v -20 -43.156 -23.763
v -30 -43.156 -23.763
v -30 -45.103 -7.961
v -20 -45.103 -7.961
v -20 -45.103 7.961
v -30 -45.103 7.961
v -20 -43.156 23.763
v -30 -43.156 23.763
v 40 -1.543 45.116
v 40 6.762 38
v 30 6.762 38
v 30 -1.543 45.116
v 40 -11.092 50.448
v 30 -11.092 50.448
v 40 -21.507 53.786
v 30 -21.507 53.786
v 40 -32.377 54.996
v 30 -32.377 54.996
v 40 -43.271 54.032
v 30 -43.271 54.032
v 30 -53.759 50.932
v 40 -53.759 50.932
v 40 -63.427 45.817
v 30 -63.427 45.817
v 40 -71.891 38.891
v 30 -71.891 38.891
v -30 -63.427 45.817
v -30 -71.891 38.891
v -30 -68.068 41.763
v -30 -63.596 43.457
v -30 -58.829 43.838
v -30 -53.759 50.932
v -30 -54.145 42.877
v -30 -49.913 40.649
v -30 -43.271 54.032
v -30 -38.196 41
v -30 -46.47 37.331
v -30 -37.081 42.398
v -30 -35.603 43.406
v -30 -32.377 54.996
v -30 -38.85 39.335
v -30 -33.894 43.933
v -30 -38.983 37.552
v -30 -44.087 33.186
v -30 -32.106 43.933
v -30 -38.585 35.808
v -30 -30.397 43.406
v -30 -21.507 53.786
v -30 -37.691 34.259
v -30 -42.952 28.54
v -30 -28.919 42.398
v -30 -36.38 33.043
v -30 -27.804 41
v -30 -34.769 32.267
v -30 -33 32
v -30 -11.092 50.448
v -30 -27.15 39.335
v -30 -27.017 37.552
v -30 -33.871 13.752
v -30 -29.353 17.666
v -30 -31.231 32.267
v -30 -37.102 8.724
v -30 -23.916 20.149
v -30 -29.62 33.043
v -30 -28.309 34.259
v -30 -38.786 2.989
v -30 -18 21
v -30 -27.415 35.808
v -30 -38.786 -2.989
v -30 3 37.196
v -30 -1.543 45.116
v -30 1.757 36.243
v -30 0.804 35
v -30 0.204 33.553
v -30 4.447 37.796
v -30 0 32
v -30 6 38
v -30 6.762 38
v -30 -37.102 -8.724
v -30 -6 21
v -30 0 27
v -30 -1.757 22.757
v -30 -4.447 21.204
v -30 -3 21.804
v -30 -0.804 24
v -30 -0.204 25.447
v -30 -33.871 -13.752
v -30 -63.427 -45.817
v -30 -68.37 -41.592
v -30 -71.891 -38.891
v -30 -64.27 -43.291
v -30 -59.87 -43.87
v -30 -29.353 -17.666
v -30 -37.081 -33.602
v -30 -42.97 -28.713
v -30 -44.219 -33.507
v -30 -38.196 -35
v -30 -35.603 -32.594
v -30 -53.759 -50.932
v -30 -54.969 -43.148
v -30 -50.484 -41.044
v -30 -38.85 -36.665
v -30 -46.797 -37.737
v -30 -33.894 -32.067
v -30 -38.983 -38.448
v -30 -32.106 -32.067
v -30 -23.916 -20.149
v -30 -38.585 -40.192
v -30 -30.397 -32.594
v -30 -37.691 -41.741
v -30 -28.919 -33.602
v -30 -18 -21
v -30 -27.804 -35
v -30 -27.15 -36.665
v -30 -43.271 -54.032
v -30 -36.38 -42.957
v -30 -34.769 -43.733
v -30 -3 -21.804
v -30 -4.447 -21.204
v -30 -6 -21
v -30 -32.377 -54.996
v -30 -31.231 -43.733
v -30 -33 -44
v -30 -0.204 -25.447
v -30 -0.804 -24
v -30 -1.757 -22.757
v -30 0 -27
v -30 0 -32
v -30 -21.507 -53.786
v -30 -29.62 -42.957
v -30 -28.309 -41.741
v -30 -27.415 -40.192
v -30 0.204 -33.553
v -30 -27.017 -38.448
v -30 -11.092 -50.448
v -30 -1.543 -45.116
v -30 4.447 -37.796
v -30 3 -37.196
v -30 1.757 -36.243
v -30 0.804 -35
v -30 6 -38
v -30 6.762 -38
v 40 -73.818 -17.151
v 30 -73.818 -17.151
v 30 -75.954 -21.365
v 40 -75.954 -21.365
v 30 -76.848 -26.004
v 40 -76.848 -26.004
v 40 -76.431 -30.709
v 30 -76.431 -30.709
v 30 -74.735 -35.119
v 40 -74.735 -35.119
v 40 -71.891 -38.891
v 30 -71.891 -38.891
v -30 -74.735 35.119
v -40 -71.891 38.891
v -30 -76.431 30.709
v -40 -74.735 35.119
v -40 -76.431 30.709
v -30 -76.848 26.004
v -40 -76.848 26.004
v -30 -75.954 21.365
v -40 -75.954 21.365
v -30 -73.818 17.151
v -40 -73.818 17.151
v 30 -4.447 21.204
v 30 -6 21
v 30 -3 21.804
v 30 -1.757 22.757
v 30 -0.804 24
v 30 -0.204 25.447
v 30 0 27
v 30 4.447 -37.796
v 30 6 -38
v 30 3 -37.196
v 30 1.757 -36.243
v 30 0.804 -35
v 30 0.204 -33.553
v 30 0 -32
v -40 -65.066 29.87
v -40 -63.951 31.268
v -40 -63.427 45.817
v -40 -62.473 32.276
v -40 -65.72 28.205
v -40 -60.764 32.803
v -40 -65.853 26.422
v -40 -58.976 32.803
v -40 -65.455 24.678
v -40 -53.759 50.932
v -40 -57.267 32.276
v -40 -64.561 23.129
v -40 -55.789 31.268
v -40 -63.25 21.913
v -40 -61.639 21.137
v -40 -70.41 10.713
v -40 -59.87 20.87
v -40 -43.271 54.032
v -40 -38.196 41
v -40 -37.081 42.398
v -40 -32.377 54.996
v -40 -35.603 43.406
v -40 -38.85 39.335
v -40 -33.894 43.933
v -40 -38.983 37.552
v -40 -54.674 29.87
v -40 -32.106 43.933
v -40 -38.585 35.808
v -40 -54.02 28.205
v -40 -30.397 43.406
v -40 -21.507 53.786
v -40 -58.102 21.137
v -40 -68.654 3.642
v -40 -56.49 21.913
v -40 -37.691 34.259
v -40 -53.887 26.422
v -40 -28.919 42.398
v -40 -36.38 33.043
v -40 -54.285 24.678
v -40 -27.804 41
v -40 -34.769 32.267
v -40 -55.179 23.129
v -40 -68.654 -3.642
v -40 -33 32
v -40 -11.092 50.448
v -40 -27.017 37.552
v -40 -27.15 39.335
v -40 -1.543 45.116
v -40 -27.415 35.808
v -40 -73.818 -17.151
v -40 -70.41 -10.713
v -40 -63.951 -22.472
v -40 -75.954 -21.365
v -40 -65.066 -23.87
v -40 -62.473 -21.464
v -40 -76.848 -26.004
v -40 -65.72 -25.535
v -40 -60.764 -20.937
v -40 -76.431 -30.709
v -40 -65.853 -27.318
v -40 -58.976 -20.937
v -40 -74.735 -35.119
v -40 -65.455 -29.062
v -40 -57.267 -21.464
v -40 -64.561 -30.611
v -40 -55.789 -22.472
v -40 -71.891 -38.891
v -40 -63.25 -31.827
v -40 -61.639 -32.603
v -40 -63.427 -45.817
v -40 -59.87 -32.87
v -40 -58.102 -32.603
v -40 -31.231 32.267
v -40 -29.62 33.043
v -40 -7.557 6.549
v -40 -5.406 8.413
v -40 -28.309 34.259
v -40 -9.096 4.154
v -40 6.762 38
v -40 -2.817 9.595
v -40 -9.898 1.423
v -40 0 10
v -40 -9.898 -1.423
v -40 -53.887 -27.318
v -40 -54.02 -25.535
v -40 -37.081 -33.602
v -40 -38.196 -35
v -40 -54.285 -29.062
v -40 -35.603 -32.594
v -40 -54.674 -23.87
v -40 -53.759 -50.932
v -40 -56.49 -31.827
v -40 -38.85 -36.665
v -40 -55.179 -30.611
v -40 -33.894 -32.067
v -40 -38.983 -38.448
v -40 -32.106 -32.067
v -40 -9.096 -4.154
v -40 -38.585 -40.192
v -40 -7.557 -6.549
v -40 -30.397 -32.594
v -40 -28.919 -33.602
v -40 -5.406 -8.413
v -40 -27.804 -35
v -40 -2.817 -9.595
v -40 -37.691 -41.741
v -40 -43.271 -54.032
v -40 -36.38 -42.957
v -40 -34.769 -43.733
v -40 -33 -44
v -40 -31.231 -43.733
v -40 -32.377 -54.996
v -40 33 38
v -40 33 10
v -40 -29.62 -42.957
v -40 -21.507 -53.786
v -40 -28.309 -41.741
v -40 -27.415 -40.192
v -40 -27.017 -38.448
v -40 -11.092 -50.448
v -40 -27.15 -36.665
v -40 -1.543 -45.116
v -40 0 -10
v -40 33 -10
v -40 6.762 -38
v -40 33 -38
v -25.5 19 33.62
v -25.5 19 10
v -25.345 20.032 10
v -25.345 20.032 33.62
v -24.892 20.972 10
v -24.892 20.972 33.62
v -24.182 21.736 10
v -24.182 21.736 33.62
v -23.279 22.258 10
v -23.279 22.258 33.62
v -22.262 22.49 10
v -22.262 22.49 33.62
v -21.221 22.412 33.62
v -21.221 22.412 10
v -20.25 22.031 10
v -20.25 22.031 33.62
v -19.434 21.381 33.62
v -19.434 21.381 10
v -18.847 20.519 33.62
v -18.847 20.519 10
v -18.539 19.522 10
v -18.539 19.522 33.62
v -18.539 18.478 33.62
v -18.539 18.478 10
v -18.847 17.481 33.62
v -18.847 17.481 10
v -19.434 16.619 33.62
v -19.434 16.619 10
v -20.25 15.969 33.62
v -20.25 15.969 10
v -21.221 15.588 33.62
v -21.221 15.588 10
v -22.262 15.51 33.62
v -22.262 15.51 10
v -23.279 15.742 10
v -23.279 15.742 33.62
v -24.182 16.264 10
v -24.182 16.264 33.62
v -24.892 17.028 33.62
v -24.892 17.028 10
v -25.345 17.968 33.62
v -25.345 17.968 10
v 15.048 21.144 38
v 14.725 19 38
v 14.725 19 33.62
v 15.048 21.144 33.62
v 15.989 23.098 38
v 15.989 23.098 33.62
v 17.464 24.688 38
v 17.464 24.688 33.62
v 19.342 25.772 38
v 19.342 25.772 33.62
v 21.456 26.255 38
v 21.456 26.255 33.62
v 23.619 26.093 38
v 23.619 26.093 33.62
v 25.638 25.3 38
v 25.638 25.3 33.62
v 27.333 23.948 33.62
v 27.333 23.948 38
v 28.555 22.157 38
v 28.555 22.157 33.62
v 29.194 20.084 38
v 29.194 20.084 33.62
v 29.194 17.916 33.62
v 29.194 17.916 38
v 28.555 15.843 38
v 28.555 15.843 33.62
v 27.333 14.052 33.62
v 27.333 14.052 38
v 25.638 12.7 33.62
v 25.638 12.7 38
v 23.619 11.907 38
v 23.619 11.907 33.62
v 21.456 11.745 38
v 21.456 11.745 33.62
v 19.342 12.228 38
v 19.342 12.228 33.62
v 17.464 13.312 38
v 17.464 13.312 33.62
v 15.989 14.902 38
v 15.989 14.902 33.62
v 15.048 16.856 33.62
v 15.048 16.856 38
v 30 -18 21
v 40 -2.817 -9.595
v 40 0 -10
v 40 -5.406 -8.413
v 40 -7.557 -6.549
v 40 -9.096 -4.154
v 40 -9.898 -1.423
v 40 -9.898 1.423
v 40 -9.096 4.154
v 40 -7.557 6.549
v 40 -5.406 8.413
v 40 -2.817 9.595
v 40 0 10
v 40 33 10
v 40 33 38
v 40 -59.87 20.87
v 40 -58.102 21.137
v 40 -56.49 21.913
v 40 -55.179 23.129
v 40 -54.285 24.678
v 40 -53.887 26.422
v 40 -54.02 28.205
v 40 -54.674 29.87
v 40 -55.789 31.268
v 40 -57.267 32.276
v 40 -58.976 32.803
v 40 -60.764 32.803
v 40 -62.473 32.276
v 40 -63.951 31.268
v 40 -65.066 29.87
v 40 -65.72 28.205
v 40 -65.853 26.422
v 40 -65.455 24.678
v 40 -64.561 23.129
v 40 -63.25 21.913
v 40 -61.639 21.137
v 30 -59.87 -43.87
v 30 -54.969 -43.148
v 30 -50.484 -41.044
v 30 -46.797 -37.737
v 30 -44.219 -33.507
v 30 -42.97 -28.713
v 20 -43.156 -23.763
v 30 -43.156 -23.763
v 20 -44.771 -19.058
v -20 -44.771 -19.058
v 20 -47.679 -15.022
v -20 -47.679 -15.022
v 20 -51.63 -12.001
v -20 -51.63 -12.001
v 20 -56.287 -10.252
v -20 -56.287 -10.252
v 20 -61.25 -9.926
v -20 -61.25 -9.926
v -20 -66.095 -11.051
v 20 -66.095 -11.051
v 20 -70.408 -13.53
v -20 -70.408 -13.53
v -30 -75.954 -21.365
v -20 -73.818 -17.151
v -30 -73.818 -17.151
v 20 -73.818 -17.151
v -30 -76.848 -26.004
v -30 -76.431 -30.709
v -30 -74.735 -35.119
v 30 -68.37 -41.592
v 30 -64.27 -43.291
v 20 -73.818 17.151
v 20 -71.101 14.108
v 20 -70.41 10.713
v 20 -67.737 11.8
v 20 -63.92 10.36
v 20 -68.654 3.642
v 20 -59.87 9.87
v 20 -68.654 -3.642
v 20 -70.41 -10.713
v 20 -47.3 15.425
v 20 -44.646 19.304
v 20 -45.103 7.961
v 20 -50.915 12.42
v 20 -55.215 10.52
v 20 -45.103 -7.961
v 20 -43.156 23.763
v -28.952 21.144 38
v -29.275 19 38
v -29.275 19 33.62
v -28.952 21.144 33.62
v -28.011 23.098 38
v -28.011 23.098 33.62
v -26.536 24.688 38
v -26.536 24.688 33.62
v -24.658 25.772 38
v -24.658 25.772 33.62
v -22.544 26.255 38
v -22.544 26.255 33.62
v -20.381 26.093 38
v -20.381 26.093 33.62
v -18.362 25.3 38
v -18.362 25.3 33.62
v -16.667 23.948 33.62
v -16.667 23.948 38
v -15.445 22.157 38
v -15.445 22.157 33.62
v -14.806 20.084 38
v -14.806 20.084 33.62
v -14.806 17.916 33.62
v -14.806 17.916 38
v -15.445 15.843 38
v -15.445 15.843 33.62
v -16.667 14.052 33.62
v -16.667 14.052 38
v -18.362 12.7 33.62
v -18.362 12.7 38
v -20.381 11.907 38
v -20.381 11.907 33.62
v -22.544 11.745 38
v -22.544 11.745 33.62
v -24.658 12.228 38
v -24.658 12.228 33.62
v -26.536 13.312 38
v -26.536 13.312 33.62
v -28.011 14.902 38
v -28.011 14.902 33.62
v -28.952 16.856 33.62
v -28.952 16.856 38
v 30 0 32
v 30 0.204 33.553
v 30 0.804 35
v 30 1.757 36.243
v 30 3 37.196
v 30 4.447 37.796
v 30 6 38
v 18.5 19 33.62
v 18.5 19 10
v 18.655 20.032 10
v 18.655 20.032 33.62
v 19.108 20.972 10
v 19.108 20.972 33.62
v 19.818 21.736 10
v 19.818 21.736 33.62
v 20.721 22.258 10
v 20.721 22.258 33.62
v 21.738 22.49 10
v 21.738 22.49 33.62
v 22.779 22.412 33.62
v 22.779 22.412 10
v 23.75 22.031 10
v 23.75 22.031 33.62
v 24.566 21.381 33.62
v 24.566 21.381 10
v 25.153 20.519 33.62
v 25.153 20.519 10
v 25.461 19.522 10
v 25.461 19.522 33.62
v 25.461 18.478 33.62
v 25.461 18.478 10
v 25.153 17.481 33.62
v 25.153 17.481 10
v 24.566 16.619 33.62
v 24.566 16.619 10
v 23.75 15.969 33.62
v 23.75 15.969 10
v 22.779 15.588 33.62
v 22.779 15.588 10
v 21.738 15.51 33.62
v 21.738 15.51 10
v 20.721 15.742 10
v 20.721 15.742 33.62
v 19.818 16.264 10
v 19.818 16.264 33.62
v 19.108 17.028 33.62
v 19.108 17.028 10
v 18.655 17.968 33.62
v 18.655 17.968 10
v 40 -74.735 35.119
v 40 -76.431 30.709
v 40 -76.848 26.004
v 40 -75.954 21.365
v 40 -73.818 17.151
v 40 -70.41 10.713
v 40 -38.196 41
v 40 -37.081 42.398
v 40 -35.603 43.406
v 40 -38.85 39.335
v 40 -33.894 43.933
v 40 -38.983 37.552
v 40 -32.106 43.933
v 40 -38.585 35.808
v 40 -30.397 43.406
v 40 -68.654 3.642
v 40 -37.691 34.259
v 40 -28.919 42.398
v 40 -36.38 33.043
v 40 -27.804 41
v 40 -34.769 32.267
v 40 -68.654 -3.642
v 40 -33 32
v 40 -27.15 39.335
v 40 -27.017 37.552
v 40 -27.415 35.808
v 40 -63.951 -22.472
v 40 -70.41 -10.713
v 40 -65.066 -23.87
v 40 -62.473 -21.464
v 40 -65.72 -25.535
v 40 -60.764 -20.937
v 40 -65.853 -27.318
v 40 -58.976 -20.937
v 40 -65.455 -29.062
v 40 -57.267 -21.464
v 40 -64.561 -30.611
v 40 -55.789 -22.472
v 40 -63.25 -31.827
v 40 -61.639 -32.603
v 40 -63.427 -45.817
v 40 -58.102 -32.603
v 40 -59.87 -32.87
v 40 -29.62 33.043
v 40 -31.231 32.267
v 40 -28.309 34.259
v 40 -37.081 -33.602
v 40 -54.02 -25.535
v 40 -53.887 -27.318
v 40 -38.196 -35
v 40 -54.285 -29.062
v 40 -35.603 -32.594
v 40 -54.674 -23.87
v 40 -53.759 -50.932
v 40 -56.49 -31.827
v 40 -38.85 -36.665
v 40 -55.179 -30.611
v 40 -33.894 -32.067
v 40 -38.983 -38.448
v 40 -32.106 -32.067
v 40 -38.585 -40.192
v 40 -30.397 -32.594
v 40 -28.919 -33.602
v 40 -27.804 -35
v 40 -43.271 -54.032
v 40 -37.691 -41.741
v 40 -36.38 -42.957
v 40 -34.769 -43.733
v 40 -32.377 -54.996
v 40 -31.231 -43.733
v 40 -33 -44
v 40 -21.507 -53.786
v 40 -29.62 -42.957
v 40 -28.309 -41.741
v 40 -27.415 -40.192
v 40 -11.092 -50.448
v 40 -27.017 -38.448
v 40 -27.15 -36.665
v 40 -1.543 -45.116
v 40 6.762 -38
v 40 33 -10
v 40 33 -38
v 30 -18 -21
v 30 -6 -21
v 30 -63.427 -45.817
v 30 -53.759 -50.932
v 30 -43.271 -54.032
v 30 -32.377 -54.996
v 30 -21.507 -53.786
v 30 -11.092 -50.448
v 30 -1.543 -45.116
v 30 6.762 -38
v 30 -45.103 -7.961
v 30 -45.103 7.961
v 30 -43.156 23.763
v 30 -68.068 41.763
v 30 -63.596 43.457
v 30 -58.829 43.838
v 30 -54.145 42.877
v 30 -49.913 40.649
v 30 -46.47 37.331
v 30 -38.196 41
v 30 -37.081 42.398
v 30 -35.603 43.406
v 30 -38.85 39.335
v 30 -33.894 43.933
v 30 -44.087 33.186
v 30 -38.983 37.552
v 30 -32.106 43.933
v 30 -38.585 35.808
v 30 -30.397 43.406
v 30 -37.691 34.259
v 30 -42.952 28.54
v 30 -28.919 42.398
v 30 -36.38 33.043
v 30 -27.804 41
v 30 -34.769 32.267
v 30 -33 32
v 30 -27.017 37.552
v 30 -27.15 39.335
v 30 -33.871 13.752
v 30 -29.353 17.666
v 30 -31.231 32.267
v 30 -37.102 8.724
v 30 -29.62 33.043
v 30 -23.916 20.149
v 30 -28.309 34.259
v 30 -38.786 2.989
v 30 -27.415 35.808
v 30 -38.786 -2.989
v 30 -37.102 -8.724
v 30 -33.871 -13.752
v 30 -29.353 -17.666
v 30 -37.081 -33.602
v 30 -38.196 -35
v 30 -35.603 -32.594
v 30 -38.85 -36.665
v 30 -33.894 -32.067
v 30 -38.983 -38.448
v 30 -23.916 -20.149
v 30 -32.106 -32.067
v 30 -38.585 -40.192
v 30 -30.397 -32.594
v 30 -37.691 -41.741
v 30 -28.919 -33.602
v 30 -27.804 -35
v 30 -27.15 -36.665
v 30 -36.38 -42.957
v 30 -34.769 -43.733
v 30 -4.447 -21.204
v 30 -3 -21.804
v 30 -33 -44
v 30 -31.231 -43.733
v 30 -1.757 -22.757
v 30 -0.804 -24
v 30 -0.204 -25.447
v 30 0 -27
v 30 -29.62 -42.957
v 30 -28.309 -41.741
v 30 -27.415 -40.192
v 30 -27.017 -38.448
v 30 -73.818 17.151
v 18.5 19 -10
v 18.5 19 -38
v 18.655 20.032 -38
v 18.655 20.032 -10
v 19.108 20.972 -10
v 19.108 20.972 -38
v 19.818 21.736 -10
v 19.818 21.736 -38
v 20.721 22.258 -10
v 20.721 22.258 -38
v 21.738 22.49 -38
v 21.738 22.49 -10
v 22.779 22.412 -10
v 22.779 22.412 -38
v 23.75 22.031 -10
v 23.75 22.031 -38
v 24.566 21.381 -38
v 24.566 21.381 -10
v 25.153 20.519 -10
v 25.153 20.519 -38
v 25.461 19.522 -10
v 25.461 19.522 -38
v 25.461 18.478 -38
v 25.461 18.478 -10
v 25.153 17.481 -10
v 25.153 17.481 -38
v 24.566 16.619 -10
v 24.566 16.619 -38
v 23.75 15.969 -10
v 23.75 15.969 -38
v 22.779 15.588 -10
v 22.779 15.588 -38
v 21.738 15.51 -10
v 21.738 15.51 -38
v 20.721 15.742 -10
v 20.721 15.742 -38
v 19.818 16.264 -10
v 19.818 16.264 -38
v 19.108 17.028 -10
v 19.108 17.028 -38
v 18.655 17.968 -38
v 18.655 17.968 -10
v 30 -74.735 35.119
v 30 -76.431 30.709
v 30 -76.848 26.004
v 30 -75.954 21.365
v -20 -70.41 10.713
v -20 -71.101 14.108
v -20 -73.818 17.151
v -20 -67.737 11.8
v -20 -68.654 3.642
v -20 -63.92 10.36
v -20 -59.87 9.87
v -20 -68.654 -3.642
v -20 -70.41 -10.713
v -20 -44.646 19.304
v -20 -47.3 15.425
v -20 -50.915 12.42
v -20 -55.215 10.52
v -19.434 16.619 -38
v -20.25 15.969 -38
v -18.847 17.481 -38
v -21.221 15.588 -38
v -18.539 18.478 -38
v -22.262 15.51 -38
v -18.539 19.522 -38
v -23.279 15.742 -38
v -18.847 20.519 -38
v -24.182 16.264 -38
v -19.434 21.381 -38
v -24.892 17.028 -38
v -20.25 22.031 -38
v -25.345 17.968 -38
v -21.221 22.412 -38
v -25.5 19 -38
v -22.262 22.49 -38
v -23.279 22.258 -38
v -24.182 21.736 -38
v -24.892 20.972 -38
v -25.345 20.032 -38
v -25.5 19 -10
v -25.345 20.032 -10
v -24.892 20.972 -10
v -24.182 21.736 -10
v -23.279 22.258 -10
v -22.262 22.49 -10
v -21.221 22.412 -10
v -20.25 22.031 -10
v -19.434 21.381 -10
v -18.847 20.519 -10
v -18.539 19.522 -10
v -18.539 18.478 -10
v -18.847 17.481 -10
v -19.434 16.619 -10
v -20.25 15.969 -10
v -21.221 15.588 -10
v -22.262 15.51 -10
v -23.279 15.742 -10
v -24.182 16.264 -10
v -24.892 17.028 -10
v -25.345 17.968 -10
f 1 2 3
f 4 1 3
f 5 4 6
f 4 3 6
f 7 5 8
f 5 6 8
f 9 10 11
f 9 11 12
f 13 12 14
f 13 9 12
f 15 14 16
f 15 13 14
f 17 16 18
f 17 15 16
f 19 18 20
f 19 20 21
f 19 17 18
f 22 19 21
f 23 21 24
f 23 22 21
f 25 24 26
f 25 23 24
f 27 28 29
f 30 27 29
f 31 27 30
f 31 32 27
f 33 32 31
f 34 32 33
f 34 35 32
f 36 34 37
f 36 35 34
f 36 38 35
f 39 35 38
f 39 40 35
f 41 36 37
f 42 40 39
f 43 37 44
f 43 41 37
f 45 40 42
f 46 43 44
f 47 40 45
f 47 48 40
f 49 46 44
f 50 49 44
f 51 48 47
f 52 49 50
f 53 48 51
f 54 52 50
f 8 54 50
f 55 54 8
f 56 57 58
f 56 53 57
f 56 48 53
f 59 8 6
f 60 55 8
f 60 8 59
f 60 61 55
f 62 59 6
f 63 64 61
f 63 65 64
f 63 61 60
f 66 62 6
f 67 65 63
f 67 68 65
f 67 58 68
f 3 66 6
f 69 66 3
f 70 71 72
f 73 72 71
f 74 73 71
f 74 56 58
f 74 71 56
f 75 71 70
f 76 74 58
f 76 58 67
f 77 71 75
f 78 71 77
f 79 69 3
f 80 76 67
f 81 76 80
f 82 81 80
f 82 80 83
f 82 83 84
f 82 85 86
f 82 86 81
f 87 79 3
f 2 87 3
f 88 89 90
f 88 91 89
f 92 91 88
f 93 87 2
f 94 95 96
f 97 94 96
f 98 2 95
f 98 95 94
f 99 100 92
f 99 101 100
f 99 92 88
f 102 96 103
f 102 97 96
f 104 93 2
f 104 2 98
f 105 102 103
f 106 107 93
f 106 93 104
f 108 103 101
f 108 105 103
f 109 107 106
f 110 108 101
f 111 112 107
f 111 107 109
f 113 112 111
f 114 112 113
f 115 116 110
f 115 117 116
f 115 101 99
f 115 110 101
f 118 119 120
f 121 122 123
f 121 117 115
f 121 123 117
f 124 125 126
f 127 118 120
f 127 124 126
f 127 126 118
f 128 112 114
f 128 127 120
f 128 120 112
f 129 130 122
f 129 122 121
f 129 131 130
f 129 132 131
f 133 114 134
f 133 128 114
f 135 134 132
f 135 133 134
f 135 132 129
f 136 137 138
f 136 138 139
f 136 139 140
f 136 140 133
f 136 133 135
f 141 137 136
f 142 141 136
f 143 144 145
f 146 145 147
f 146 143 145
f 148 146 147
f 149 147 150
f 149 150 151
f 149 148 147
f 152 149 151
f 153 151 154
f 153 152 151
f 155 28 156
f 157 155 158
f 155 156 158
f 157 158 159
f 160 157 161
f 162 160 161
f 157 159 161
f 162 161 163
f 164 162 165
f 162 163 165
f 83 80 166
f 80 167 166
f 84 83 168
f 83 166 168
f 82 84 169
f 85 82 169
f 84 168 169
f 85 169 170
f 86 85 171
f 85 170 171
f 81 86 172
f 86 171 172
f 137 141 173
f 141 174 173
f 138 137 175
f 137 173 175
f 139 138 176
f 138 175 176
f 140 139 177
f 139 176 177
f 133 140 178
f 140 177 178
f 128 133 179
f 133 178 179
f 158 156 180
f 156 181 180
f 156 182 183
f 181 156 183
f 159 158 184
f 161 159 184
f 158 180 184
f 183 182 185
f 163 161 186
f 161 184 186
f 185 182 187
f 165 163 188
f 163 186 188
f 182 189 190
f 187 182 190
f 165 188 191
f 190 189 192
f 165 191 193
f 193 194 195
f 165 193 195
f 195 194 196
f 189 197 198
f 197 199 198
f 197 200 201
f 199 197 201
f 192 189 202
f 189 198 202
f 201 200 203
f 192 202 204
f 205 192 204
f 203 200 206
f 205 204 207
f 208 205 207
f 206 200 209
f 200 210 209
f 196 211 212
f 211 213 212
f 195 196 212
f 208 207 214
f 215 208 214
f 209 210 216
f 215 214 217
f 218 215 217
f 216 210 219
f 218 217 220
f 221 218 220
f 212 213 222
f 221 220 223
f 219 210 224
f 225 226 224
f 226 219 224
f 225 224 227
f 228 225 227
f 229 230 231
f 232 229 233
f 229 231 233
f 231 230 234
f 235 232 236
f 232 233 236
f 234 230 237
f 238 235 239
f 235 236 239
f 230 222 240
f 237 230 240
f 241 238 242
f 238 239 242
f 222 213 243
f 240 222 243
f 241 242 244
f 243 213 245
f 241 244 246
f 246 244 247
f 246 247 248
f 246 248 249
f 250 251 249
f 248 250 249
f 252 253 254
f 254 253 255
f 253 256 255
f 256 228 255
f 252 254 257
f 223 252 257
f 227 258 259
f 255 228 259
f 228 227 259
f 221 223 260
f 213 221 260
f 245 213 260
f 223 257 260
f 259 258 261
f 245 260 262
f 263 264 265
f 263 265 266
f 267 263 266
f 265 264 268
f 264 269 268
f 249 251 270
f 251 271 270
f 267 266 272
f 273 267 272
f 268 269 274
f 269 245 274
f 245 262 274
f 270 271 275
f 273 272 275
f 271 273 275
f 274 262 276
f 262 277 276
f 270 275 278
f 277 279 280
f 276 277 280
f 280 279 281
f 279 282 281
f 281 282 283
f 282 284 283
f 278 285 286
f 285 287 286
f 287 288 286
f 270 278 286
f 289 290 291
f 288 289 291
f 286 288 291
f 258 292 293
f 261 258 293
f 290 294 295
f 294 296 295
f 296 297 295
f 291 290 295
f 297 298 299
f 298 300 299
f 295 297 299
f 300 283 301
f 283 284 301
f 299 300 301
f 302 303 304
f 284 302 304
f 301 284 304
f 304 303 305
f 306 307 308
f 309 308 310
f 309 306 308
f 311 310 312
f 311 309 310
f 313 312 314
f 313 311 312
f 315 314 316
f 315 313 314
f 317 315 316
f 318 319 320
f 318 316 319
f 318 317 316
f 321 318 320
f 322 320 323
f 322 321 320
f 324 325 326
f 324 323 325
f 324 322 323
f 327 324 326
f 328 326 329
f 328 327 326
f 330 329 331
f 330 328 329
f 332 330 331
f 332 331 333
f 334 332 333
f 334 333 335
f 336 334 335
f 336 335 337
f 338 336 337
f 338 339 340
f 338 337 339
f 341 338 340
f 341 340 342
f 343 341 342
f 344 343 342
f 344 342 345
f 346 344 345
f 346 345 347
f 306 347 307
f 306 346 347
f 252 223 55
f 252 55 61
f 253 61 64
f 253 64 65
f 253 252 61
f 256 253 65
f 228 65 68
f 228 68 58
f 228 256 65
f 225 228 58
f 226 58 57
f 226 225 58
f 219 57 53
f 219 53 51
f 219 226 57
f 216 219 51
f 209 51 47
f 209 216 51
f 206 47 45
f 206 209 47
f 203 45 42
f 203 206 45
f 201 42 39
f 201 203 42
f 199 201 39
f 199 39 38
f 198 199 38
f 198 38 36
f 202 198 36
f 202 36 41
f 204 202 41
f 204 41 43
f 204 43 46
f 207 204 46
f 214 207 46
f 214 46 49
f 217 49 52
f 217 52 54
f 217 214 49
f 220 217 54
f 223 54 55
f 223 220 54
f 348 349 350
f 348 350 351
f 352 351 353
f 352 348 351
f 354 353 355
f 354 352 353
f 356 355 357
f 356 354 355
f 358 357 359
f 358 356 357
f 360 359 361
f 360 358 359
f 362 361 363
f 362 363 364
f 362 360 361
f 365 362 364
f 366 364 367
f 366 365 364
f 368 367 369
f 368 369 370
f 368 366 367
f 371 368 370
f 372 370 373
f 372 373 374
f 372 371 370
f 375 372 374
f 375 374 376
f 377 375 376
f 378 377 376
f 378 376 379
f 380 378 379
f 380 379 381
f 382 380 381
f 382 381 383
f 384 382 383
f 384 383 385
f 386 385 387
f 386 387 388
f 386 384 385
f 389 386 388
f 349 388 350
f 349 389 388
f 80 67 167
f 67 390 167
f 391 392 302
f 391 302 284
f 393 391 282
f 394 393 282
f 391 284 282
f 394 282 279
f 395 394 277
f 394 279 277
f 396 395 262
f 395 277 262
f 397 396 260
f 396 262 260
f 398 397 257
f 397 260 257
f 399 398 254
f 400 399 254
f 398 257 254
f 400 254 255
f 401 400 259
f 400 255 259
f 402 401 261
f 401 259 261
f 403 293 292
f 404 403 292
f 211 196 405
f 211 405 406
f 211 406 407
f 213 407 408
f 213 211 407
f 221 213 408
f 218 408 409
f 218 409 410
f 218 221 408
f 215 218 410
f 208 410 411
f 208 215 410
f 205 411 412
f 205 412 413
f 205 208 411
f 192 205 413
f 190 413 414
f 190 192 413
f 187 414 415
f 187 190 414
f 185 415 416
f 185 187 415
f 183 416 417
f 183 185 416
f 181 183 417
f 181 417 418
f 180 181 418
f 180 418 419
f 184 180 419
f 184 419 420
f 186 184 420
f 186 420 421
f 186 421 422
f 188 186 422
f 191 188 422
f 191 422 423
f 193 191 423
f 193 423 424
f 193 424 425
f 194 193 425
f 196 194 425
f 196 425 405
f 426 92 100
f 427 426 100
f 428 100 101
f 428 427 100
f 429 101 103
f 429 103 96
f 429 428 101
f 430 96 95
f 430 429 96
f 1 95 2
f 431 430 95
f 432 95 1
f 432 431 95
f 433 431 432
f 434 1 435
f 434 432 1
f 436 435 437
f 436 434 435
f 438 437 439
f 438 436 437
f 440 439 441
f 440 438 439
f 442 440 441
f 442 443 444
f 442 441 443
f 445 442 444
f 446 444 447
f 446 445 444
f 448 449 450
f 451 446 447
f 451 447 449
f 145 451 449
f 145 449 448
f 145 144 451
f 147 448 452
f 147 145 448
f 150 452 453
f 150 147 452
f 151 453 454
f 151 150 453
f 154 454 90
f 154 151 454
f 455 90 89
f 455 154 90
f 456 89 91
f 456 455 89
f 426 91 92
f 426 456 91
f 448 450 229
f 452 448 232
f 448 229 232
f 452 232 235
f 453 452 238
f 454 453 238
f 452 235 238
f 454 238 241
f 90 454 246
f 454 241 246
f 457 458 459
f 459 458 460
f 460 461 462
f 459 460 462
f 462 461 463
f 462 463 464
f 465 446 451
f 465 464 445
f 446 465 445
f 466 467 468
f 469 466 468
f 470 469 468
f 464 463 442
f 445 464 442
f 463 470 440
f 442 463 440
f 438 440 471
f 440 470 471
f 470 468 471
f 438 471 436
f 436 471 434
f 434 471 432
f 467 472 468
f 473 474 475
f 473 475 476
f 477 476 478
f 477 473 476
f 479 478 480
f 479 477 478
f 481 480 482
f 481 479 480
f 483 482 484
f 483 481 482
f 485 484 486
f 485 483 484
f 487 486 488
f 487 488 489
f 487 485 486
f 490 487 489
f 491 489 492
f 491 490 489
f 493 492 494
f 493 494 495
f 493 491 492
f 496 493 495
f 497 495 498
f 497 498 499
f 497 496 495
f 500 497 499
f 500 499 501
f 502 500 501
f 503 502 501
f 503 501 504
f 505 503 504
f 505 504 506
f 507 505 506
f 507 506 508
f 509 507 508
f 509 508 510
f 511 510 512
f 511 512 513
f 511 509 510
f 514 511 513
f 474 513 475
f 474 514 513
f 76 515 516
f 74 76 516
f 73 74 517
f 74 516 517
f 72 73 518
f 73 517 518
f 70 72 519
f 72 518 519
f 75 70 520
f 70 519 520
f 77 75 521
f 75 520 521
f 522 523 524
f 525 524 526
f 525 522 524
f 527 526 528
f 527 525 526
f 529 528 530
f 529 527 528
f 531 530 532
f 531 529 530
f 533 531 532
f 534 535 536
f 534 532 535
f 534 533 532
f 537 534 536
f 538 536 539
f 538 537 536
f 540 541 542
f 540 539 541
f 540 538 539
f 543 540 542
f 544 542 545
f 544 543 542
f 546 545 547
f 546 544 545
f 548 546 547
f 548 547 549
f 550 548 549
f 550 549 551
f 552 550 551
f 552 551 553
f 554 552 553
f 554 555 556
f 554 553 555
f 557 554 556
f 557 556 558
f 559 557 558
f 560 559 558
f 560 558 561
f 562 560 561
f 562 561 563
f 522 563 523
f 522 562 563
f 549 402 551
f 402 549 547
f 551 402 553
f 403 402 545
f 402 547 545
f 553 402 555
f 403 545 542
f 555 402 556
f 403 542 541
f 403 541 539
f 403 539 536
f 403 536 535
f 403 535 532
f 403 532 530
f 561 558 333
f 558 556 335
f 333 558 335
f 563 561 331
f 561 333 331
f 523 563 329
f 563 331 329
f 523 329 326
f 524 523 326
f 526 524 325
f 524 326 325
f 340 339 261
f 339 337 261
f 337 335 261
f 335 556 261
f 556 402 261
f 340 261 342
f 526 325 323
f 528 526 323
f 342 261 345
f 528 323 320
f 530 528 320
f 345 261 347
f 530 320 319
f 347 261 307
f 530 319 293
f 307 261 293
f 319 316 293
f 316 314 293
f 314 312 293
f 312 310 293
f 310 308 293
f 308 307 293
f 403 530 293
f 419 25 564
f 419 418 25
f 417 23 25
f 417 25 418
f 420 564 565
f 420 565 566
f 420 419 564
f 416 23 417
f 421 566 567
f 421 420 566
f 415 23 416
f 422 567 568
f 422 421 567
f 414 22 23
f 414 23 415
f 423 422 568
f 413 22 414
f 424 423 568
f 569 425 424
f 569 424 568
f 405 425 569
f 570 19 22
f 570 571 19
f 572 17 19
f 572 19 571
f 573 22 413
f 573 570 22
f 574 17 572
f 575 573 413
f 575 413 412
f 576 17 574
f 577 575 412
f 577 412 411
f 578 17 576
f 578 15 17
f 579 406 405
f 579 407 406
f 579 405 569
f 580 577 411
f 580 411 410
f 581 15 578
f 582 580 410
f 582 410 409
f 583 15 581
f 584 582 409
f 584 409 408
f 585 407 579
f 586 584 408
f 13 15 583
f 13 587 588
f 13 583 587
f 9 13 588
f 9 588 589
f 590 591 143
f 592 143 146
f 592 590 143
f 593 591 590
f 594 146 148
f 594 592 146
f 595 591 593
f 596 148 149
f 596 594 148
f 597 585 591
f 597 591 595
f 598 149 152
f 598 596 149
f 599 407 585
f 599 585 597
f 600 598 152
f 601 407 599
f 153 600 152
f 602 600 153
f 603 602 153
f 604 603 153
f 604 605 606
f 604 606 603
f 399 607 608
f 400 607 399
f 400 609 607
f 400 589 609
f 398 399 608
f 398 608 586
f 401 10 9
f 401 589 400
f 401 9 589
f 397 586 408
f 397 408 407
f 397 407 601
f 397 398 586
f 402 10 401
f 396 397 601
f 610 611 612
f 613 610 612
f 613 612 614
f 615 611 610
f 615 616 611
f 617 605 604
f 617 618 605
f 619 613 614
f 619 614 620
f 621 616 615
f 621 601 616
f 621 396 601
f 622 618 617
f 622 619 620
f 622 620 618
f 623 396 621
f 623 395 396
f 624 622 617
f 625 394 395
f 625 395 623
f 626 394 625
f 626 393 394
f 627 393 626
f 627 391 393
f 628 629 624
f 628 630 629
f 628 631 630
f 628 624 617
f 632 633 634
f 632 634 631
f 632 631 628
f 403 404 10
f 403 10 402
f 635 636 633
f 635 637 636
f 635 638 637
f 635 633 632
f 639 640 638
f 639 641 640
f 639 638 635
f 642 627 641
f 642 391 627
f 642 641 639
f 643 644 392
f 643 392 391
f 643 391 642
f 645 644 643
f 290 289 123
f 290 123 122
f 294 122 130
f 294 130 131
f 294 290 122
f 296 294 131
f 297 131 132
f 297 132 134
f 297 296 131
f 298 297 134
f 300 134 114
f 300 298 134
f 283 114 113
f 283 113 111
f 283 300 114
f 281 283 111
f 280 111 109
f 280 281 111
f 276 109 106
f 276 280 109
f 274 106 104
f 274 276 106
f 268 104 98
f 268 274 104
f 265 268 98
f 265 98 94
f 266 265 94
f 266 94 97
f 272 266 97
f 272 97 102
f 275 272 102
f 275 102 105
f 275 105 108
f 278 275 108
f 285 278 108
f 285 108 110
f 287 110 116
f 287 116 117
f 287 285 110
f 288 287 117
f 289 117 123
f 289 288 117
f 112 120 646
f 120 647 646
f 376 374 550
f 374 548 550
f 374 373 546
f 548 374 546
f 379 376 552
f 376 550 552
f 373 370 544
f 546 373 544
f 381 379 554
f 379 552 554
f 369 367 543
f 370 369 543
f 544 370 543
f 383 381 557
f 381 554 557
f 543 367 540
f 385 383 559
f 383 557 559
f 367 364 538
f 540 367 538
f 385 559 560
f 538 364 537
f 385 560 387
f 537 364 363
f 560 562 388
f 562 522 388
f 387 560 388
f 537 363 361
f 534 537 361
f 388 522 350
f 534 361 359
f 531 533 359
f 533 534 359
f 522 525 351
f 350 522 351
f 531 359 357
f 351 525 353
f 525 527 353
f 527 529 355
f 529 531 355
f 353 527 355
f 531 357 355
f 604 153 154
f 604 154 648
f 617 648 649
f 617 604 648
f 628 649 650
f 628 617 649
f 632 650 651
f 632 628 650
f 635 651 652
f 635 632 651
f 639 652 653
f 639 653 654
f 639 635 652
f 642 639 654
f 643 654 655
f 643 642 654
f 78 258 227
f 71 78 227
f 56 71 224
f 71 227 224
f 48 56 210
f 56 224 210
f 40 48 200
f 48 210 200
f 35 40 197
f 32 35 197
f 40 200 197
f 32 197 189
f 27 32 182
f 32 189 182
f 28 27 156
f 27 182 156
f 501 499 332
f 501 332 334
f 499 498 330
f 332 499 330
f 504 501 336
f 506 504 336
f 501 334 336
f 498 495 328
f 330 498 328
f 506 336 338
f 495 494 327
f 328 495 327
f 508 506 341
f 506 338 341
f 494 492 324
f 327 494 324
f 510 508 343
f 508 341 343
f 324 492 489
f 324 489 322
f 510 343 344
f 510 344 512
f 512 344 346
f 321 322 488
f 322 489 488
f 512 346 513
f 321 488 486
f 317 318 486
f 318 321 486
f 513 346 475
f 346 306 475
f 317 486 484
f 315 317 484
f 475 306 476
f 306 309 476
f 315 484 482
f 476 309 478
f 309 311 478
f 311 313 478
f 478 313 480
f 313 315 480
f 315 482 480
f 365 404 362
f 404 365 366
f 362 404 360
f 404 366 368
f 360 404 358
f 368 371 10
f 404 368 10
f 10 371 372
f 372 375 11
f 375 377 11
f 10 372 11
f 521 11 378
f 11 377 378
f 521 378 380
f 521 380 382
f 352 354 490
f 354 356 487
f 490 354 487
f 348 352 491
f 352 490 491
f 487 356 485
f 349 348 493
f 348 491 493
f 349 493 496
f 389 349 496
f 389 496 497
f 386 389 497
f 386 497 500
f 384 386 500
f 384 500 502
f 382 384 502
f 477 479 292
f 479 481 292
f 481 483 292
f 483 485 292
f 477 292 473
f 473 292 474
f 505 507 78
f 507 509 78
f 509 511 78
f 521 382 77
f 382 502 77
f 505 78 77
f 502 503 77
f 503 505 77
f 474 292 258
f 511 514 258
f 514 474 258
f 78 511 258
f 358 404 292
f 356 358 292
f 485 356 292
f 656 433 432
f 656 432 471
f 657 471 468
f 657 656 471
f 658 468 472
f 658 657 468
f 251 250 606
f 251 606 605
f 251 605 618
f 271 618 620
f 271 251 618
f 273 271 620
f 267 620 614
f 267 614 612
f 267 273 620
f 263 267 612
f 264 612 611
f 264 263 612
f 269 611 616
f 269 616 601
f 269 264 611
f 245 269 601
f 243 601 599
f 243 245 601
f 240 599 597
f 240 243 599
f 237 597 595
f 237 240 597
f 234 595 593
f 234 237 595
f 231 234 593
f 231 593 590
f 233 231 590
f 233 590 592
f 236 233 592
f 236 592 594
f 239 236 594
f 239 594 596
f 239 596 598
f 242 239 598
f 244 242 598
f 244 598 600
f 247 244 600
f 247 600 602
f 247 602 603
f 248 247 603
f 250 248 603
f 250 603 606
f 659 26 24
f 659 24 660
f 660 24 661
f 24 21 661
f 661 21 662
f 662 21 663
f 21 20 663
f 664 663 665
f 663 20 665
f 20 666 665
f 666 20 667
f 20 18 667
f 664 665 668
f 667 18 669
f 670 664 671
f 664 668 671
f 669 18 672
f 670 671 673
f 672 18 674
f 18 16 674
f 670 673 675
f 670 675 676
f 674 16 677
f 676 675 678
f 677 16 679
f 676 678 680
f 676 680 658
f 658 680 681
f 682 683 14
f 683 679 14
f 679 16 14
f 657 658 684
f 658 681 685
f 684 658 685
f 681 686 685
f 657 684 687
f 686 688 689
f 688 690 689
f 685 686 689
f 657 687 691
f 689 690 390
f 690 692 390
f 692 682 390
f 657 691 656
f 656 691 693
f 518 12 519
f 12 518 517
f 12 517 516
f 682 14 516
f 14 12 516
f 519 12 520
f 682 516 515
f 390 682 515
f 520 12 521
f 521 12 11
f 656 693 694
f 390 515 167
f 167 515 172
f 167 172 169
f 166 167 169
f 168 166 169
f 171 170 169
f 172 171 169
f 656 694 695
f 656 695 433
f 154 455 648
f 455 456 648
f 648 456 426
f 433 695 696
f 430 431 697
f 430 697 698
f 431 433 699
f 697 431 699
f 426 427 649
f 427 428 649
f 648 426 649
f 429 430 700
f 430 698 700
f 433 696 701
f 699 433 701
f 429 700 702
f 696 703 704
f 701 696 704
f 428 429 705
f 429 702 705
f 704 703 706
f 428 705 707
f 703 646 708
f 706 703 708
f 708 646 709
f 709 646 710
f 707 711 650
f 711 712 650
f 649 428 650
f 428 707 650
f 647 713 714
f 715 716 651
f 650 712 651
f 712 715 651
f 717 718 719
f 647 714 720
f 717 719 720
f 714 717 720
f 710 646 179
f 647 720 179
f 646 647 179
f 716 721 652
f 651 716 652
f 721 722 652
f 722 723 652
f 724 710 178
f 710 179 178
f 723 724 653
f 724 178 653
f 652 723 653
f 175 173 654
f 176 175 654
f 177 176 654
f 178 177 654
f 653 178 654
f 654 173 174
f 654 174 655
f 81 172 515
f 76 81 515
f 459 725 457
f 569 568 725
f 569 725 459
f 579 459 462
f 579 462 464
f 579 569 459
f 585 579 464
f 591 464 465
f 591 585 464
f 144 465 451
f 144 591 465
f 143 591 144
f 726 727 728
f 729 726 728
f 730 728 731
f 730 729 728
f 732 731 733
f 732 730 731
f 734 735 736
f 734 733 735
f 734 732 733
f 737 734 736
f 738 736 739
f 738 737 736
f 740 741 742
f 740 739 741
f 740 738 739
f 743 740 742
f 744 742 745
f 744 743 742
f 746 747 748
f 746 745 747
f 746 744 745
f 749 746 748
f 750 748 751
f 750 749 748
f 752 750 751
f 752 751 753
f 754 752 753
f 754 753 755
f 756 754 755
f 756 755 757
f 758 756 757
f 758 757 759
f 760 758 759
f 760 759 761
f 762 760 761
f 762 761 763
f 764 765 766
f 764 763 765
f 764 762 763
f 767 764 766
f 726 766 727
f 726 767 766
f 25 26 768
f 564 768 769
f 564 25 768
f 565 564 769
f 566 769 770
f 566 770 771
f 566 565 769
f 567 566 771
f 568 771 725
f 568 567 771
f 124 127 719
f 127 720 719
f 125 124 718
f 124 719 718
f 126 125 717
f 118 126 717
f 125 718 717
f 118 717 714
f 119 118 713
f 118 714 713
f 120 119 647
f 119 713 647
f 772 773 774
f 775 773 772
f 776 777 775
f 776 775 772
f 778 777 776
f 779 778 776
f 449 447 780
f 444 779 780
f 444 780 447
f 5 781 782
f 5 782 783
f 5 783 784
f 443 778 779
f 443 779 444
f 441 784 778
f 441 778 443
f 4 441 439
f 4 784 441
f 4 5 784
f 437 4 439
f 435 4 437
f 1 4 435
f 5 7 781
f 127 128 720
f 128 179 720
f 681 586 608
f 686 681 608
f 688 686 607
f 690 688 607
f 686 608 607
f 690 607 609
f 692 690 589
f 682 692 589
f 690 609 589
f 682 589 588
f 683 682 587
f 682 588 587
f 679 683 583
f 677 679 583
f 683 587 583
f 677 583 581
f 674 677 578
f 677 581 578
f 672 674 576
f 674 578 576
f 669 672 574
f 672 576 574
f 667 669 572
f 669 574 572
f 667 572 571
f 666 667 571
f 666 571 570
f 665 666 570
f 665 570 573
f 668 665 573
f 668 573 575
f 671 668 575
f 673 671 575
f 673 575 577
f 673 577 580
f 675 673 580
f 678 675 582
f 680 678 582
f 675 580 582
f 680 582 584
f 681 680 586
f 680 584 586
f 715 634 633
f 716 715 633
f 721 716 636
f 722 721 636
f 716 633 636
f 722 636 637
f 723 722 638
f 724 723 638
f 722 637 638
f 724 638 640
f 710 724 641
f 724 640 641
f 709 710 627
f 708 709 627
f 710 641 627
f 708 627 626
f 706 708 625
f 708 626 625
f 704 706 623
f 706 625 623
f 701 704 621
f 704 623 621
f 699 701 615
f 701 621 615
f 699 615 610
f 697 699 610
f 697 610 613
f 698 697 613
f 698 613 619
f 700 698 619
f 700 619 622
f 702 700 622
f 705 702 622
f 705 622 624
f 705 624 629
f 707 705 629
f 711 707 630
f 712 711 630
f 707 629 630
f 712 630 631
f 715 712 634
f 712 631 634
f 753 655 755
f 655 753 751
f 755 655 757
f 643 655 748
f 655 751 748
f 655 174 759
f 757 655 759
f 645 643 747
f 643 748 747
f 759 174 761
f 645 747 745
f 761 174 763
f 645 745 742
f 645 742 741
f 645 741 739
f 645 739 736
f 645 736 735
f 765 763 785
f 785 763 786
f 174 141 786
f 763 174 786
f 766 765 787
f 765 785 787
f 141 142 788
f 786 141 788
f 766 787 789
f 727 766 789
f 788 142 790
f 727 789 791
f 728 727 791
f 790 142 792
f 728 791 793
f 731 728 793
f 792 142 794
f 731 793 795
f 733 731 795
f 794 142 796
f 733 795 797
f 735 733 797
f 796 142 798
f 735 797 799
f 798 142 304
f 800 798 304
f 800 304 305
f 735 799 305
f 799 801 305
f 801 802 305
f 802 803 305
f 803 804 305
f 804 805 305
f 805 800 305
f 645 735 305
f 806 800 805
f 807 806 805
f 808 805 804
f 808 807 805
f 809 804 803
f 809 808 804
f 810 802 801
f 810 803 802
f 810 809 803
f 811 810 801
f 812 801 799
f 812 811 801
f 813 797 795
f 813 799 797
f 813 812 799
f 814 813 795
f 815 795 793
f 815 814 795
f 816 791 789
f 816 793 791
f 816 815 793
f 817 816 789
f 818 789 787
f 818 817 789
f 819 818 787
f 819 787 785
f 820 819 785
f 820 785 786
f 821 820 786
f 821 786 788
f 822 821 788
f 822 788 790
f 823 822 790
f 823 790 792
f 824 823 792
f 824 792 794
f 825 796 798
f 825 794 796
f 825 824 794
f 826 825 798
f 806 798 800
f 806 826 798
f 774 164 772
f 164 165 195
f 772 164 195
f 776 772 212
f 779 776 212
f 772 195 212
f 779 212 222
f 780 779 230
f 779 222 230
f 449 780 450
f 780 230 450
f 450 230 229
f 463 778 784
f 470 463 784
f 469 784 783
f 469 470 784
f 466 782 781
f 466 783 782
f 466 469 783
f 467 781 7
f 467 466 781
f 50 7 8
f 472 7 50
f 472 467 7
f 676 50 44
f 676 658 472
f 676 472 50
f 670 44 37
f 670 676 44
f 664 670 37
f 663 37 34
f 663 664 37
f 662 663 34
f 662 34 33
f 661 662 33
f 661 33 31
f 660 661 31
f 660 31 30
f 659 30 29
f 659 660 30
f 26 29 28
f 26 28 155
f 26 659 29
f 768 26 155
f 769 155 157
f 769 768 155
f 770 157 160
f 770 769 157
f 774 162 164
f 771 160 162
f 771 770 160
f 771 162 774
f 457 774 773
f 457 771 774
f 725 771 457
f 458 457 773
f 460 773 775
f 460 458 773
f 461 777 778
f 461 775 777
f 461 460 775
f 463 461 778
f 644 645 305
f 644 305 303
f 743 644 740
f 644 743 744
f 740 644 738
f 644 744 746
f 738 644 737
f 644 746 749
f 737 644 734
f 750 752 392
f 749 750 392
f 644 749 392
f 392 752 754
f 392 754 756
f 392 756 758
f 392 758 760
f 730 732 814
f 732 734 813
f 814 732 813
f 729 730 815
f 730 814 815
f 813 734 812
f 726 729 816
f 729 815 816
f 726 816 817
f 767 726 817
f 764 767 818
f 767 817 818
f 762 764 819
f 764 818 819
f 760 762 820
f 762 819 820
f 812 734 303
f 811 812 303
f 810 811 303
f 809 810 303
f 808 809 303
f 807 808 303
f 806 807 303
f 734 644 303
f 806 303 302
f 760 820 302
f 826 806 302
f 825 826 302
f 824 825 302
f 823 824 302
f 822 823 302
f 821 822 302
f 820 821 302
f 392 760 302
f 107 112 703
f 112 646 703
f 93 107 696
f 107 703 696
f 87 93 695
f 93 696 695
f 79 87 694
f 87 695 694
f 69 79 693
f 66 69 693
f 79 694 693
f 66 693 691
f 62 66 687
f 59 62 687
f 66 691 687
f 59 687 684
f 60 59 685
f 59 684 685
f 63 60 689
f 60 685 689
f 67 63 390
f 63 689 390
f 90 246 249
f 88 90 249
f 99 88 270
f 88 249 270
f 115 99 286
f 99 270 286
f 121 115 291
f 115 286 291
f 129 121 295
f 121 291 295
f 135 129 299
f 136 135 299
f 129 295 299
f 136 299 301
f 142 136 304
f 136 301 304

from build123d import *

# Parameters (mm, degrees)
SKETCH3_R               = 17
BOSS_EXTRUDE1_DEPTH     = 30
BOSS_EXTRUDE1_2_DEPTH   = 30
BOSS_EXTRUDE1_3_DEPTH   = 30
BOSS_EXTRUDE2_START     = 10
SKETCH4_R               = 6
BOSS_EXTRUDE2_DEPTH     = 10
CUT_EXTRUDE1_DEPTH      = 112.955374005
CUT_EXTRUDE1_DEPTH_BACK = 112.955374005
SKETCH4_4_R             = 6
SKETCH5_R               = 7.275
SKETCH5_R_2             = 3.5
CUT_EXTRUDE2_DEPTH      = 4.38
CUT_EXTRUDE3_DEPTH      = 128.114144644
CUT_EXTRUDE3_DEPTH_BACK = 128.114144644
SKETCH5_2_R             = 3.5
BOSS_EXTRUDE3_DEPTH     = 10


with BuildPart() as part:
    # Sketch3 → Boss-Extrude1 (new, symmetric)
    with BuildSketch(Plane(origin=(0, 0, 0), x_dir=(0, 0, -1), z_dir=(1, 0, 0))):
        with Locations((-26.870057685, -59.870057685)):
            Circle(SKETCH3_R)
    extrude(amount=BOSS_EXTRUDE1_DEPTH, both=True)



with BuildPart() as body_2:
    # Sketch3 → Boss-Extrude1 2 (new, symmetric)
    with BuildSketch(Plane(origin=(0, 0, 0), x_dir=(0, 0, -1), z_dir=(1, 0, 0))):
        with Locations((26.870057685, -59.870057685)):
            Circle(SKETCH3_R)
    extrude(amount=BOSS_EXTRUDE1_2_DEPTH, both=True)


with BuildPart() as body_3:
    # Sketch3 → Boss-Extrude1 3 (new, symmetric)
    with BuildSketch(Plane(origin=(0, 0, 0), x_dir=(0, 0, -1), z_dir=(1, 0, 0))):
        with BuildLine():
            Line((-38, 6), (-38, 33))
            Line((-38, 33), (-10, 33))
            Line((-10, 33), (-10, 0))
            ThreePointArc((-10, 0), (0, -10), (10, 0))
            Line((10, 0), (10, 33))
            Line((10, 33), (38, 33))
            Line((38, 33), (38, 6))
            ThreePointArc((38, 6), (36.242640687, 1.757359313), (32, 0))
            Line((32, 0), (27, 0))
            ThreePointArc((27, 0), (22.757359313, -1.757359313), (21, -6))
            Line((21, -6), (21, -18))
            ThreePointArc((21, -18), (0, -39), (-21, -18))
            Line((-21, -18), (-21, -6))
            ThreePointArc((-21, -6), (-22.757359313, -1.757359313), (-27, 0))
            Line((-27, 0), (-32, 0))
            ThreePointArc((-32, 0), (-36.242640687, 1.757359313), (-38, 6))
        make_face()
    extrude(amount=BOSS_EXTRUDE1_3_DEPTH, both=True)


with BuildPart() as part_1:
    add(part.part)

    add(body_2.part)  # Boss-Extrude2 merges body 2

    add(body_3.part)  # Boss-Extrude2 merges body 3
    # Sketch4 → Boss-Extrude2 (add)
    with BuildSketch(Plane(origin=(30, 0, 0), x_dir=(0, 0, -1), z_dir=(1, 0, 0)).offset(BOSS_EXTRUDE2_START)):
        with BuildLine():
            ThreePointArc((-17.15110065, -73.817884546), (0, -68.431696654), (17.15110065, -73.817884546))
            ThreePointArc((17.15110065, -73.817884546), (28.371051107, -76.803663879), (38.890872965, -71.890872965))
            ThreePointArc((38.890872965, -71.890872965), (54.996472268, -32.377072968), (38, 6.761790704))
            Line((38, 6.761790704), (38, 33))
            Line((38, 33), (10, 33))
            Line((10, 33), (10, 0))
            ThreePointArc((10, 0), (0, -10), (-10, 0))
            Line((-10, 0), (-10, 33))
            Line((-10, 33), (-38, 33))
            Line((-38, 33), (-38, 6.761790704))
            ThreePointArc((-38, 6.761790704), (-54.996472268, -32.377072968), (-38.890872965, -71.890872965))
            ThreePointArc((-38.890872965, -71.890872965), (-28.371051107, -76.803663879), (-17.15110065, -73.817884546))
        make_face()
        with Locations((-26.870057685, -59.870057685)):
            Circle(SKETCH4_R, mode=Mode.SUBTRACT)
        with Locations((-38, -33)):
            Circle(SKETCH4_R, mode=Mode.SUBTRACT)
        with Locations((38, -33)):
            Circle(SKETCH4_R, mode=Mode.SUBTRACT)
        with Locations((26.870057685, -59.870057685)):
            Circle(SKETCH4_R, mode=Mode.SUBTRACT)
    boss_extrude2 = extrude(amount=-BOSS_EXTRUDE2_DEPTH)

    # Sketch4<4> → Cut-Extrude1 (cut, two sides: drawn at the far end of the back side and taken through both)
    with BuildSketch(Plane(origin=(30, 0, 0), x_dir=(0, 0, -1), z_dir=(1, 0, 0)).offset(-CUT_EXTRUDE1_DEPTH_BACK)):
        with Locations((-26.870057685, -59.870057685)):
            Circle(SKETCH4_4_R)
        with Locations((26.870057685, -59.870057685)):
            Circle(SKETCH4_4_R)
    extrude(amount=CUT_EXTRUDE1_DEPTH + CUT_EXTRUDE1_DEPTH_BACK, mode=Mode.SUBTRACT)

    # Mirror1: Boss-Extrude2 across plane
    add(boss_extrude2.mirror(Plane(origin=(0, 0, 0), x_dir=(0, 0, 1), z_dir=(1, 0, 0))))

    # Sketch5 → Cut-Extrude2 (cut)
    # profile 1 of 2: a face of its own
    with BuildSketch(Plane(origin=(0, 0, 38), x_dir=(-1, 0, 0), z_dir=(0, 0, -1))):
        with Locations((22, 19)):
            Circle(SKETCH5_R)
        with Locations((22, 19)):
            Circle(SKETCH5_R_2, mode=Mode.SUBTRACT)
    # profile 2 of 2: a face of its own
    with BuildSketch(Plane(origin=(0, 0, 38), x_dir=(-1, 0, 0), z_dir=(0, 0, -1))):
        with Locations((-22, 19)):
            Circle(SKETCH5_R)
        with Locations((-22, 19)):
            Circle(SKETCH5_R_2, mode=Mode.SUBTRACT)
    extrude(amount=CUT_EXTRUDE2_DEPTH, mode=Mode.SUBTRACT)

    # Sketch5<2> → Cut-Extrude3 (cut, two sides: drawn at the far end of the back side and taken through both)
    with BuildSketch(Plane(origin=(0, 0, 38), x_dir=(-1, 0, 0), z_dir=(0, 0, -1)).offset(-CUT_EXTRUDE3_DEPTH_BACK)):
        with Locations((22, 19)):
            Circle(SKETCH5_2_R)
        with Locations((-22, 19)):
            Circle(SKETCH5_2_R)
    extrude(amount=CUT_EXTRUDE3_DEPTH + CUT_EXTRUDE3_DEPTH_BACK, mode=Mode.SUBTRACT)

    # Sketch4<5> → Boss-Extrude3 (add)
    with BuildSketch(Plane(origin=(30, 0, 0), x_dir=(0, 0, -1), z_dir=(1, 0, 0))):
        with BuildLine():
            ThreePointArc((23.762636048, -43.156472469), (0, -45.346703171), (-23.762636048, -43.156472469))
            ThreePointArc((-23.762636048, -43.156472469), (-13.796684596, -49.003277293), (-9.870057685, -59.870057685))
            ThreePointArc((-9.870057685, -59.870057685), (-11.799850825, -67.737005327), (-17.15110065, -73.817884546))
            ThreePointArc((-17.15110065, -73.817884546), (0, -68.431696654), (17.15110065, -73.817884546))
            ThreePointArc((17.15110065, -73.817884546), (10.25200891, -56.286699637), (23.762636048, -43.156472469))
        make_face()
    boss_extrude3 = extrude(amount=-BOSS_EXTRUDE3_DEPTH)

    # Mirror2: Boss-Extrude3 across plane
    add(boss_extrude3.mirror(Plane(origin=(0, 0, 0), x_dir=(0, 0, 1), z_dir=(1, 0, 0))))


solid = part_1.part
